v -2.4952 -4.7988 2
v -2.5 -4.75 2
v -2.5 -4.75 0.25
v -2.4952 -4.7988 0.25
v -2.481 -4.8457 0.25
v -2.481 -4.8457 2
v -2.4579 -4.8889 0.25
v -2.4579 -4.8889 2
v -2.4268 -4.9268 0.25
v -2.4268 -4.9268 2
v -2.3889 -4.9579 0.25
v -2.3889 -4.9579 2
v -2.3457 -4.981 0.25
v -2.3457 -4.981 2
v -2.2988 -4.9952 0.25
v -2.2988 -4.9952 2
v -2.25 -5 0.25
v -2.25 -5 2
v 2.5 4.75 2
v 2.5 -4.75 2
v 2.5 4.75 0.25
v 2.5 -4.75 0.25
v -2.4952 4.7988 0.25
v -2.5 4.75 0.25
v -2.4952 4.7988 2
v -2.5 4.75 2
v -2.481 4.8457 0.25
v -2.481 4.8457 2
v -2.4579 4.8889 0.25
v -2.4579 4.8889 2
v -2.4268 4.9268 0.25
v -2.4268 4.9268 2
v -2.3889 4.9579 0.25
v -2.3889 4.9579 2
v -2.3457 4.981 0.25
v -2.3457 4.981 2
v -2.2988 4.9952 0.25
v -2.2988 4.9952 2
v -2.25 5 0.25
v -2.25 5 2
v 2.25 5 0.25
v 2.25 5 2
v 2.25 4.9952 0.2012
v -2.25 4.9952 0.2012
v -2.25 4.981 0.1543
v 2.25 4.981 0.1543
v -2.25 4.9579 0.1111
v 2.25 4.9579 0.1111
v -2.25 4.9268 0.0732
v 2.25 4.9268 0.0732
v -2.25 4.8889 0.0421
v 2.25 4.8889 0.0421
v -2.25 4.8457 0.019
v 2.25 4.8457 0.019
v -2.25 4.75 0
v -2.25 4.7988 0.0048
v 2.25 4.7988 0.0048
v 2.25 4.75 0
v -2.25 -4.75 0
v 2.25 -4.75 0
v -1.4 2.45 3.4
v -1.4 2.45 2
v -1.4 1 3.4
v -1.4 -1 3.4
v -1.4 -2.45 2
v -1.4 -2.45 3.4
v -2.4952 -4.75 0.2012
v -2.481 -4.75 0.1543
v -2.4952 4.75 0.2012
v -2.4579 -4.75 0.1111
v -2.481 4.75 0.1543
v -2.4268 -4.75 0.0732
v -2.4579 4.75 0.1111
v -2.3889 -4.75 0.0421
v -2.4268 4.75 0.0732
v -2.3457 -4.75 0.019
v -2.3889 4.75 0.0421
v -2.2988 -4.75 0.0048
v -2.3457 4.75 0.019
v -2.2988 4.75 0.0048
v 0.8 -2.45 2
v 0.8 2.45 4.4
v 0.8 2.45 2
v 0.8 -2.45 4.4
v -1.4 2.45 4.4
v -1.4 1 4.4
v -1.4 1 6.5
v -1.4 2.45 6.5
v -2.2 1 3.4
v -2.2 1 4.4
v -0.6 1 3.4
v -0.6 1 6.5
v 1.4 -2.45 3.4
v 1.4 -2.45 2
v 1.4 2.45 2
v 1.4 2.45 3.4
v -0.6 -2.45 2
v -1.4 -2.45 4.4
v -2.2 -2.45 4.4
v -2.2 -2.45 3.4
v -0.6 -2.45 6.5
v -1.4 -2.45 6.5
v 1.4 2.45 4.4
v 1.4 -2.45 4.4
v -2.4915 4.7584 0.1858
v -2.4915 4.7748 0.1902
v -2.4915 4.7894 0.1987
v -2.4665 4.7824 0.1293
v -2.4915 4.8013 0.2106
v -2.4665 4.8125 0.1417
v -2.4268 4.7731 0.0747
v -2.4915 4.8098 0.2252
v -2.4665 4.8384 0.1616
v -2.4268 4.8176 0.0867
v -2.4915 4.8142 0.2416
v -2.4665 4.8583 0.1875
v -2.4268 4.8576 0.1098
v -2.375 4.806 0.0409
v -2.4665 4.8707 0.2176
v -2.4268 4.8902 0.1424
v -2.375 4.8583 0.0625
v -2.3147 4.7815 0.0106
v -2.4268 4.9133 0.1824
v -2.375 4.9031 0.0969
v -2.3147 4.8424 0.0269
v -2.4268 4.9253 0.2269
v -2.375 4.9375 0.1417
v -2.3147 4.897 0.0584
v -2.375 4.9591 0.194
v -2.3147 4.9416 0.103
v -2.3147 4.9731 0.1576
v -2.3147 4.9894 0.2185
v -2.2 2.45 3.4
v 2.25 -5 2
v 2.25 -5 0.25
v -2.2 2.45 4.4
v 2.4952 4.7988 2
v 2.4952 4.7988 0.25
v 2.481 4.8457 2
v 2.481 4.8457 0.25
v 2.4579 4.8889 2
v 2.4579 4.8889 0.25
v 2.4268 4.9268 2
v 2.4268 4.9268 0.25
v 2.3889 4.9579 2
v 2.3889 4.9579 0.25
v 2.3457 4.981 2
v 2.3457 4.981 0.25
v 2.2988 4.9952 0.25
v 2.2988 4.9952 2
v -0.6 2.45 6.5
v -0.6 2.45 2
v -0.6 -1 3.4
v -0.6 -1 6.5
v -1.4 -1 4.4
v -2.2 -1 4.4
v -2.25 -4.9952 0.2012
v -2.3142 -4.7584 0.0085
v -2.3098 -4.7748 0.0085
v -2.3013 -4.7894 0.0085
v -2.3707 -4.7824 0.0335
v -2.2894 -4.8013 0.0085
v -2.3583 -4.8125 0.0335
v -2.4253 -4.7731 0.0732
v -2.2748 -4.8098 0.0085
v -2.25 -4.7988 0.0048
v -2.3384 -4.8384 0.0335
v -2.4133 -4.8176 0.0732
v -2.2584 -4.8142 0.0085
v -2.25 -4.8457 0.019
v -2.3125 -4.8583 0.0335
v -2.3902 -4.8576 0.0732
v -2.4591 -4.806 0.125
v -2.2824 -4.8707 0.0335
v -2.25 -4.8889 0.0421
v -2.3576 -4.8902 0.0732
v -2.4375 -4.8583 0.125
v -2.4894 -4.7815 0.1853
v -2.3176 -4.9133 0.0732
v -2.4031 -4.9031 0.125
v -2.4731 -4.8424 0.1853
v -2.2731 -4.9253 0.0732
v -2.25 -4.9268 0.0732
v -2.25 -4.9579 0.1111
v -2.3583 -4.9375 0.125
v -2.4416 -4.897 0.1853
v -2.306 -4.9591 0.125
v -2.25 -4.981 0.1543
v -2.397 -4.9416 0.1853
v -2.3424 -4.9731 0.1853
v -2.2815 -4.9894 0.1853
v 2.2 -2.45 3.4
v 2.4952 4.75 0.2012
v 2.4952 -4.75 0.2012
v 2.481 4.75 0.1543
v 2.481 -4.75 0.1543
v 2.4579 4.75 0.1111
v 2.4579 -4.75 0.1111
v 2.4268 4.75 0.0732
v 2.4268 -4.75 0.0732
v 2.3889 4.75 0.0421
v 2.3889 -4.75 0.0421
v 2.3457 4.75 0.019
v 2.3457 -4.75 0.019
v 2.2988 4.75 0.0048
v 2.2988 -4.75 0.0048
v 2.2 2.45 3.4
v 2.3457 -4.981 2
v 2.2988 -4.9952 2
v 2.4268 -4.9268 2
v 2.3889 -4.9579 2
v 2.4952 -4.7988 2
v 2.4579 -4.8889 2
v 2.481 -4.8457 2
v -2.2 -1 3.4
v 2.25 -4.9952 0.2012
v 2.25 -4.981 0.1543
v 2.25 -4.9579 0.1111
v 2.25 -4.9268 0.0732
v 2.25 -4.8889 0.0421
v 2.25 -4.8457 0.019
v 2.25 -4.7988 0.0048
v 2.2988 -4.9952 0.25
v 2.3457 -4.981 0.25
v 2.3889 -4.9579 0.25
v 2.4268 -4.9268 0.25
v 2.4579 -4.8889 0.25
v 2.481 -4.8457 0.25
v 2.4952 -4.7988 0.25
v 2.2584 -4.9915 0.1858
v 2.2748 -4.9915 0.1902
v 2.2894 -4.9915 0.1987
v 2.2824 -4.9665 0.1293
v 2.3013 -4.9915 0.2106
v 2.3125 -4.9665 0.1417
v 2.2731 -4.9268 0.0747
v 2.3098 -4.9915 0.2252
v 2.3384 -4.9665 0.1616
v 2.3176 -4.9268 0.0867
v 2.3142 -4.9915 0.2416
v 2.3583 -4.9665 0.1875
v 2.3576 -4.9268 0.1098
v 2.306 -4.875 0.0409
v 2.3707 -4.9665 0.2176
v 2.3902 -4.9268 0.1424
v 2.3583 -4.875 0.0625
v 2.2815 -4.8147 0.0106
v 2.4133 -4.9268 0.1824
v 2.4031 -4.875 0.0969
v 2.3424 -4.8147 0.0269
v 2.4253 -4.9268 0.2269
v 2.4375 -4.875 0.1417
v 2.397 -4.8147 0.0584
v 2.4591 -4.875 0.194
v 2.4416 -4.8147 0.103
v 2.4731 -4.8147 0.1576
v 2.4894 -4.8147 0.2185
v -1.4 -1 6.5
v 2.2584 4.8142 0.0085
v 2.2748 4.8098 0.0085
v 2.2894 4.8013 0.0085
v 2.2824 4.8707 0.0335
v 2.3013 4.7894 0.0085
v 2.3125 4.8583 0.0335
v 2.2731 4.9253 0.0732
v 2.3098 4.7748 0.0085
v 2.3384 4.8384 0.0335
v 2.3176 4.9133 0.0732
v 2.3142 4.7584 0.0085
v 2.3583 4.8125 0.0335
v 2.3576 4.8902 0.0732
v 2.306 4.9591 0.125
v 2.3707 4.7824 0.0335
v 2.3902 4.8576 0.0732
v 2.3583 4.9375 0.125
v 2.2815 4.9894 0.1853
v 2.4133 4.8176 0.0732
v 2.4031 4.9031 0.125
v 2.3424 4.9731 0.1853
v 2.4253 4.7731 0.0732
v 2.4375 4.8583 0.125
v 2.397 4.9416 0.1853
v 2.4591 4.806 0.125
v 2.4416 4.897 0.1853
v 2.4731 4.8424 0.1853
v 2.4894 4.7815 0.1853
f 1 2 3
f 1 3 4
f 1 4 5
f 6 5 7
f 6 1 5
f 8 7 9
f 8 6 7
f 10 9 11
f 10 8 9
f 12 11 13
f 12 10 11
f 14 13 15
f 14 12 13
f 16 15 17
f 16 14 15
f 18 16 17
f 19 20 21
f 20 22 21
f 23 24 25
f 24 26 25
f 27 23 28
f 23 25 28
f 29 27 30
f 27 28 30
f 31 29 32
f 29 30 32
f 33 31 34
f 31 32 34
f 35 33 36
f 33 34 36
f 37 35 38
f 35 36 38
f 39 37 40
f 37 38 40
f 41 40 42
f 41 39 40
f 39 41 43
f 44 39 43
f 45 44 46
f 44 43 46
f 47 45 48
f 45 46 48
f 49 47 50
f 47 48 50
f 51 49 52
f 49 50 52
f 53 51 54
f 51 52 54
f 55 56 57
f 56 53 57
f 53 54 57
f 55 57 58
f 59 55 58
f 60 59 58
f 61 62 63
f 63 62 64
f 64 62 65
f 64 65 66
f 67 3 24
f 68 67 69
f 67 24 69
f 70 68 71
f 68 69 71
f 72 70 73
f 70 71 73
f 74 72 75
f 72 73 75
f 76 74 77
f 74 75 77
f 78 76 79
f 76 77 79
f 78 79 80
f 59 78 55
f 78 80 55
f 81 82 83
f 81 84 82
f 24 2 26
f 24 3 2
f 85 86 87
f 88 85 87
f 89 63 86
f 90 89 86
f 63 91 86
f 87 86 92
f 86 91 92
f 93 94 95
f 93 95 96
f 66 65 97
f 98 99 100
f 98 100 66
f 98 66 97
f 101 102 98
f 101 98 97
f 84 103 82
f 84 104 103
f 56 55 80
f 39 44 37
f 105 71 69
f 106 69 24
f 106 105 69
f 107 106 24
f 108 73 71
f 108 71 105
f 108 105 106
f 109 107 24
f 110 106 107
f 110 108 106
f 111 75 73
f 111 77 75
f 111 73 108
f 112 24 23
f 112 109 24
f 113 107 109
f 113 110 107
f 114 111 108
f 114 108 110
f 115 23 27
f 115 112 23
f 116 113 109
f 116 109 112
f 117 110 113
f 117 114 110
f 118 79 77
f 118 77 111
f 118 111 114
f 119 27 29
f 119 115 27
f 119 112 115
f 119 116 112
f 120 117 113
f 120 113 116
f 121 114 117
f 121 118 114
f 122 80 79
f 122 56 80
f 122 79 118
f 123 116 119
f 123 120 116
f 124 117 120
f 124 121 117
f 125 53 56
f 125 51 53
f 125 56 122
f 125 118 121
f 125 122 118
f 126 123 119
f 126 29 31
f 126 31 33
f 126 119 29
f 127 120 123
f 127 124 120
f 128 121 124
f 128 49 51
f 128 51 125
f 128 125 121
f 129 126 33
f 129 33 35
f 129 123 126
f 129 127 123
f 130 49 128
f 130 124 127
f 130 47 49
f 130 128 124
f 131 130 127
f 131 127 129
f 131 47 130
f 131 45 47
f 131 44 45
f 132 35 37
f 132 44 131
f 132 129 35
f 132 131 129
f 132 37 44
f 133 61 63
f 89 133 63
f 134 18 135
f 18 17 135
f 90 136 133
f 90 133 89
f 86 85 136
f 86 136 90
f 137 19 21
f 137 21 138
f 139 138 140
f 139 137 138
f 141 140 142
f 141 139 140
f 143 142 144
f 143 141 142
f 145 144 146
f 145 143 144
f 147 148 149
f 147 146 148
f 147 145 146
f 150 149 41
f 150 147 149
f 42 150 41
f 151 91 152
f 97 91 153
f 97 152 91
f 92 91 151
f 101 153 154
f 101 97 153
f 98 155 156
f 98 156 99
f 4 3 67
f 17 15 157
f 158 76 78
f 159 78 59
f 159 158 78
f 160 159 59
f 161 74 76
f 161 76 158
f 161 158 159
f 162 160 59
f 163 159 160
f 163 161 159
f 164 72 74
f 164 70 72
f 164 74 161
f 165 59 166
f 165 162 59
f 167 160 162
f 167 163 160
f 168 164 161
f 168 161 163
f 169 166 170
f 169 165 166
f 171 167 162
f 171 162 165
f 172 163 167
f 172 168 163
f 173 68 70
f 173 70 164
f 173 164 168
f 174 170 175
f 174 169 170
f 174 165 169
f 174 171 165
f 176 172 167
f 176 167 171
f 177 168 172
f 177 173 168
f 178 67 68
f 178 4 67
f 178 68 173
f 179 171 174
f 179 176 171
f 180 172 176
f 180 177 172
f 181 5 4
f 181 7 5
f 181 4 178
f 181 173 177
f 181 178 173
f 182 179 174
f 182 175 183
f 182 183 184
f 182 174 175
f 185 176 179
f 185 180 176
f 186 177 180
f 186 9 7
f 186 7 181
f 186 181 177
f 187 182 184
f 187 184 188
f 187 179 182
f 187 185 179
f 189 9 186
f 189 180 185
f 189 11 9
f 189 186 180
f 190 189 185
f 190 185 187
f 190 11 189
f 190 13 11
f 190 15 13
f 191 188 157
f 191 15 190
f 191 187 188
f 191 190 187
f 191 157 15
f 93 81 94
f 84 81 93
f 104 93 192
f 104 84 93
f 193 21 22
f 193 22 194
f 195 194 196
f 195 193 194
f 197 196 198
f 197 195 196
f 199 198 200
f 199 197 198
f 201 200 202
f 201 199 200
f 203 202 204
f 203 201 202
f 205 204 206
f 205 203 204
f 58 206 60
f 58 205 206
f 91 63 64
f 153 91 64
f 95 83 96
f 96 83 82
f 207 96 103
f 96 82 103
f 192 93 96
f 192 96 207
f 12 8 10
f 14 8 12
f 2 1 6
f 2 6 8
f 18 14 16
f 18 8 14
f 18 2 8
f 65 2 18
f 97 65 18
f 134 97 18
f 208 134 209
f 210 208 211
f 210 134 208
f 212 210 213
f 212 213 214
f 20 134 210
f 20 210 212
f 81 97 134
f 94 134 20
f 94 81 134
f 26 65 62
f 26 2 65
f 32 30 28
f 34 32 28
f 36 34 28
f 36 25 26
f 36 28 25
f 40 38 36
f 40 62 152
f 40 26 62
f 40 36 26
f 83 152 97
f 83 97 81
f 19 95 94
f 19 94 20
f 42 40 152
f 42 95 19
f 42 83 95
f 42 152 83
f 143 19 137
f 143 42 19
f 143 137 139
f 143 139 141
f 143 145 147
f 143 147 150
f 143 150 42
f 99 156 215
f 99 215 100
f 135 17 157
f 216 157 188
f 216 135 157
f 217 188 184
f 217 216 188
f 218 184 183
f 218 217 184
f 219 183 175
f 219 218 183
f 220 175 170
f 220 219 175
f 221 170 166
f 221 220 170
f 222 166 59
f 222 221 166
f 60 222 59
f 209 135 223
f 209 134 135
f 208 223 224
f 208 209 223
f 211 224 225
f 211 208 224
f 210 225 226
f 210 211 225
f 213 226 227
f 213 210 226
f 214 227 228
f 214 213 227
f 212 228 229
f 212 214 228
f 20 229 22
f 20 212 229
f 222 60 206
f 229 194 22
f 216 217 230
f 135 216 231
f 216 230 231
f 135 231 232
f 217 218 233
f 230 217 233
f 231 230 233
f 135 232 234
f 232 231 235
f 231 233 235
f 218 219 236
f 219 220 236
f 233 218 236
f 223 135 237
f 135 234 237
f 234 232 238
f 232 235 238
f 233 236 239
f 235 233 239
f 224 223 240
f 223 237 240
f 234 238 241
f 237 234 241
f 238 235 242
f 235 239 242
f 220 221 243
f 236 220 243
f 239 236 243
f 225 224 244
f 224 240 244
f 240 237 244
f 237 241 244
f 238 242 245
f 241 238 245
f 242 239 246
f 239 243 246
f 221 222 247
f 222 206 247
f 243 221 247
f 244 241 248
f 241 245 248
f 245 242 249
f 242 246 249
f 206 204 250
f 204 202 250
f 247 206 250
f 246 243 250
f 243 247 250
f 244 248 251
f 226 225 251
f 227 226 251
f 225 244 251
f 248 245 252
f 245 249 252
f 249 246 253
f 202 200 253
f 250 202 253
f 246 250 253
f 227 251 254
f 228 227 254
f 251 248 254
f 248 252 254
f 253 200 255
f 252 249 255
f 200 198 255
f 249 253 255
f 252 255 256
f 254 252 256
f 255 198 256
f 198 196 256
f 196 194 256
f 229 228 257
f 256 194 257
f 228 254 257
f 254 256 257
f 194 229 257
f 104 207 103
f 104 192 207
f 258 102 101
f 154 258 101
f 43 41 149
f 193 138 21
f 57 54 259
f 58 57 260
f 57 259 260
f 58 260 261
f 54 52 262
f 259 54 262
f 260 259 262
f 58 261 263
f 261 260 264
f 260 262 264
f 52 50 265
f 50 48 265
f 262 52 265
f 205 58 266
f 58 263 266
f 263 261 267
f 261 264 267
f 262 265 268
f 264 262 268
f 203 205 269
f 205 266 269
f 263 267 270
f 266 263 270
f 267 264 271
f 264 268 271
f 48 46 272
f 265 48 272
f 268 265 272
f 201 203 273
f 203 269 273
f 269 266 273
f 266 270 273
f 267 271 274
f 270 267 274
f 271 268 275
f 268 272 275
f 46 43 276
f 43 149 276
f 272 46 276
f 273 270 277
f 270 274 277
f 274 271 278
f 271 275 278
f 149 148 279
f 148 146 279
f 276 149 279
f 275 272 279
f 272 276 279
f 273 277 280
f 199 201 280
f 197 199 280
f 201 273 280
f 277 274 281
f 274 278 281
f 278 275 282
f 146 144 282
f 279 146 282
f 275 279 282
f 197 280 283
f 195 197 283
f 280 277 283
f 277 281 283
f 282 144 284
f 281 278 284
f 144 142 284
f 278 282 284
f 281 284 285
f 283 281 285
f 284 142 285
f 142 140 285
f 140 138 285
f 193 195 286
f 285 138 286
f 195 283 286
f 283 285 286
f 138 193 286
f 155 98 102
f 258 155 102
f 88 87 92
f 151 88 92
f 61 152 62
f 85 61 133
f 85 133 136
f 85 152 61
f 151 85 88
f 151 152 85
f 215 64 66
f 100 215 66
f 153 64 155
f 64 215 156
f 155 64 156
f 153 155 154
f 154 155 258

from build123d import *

# Parameters (mm, degrees)
F0_W      = 5
F0_H      = 10
F1_DEPTH  = 2
F2_R      = 0.25
F4_DEPTH  = 2.45
F5_W      = 0.8
F5_H      = 4.5
F6_DEPTH  = 2.45
F7_W      = 2
F7_H      = 3.1
F8_DEPTH  = 0.8
F9_W      = 1.45
F9_H      = 1
F10_DEPTH = 0.8


# Not quite as in the source:
# - a feature names something its author has since deleted; it is built from what else it names


with BuildPart() as f1:
    # F0 (on Top) → F1 (new body)
    with BuildSketch(Plane.XY):
        Rectangle(F0_W, F0_H)
    extrude(amount=F1_DEPTH)

    # F2
    f2_edges = [f1.edges().sort_by_distance(p)[0] for p in [
        (2.5, 5, 1),
        (-2.5, -5, 1),
        (0, 5, 0),
        (2.5, 0, 0),
        (-2.5, 0, 0),
        (0, -5, 0),
        (-2.5, 5, 1),
        (2.5, -5, 1),
    ]]
    fillet(f2_edges, radius=F2_R)

    # F3 (on Front) → F4 (join, symmetric)
    with BuildSketch(Plane.XZ):
        Polygon((0.8, 4.4), (0.8, 2), (1.4, 2), (1.4, 3.4), (2.2, 3.4), (1.4, 4.4), align=None)
    extrude(amount=F4_DEPTH, both=True)

    # F5 (on Front) → F6 (join, symmetric)
    with BuildSketch(Plane.XZ):
        with Locations((-1, 4.25)):
            Rectangle(F5_W, F5_H)
    extrude(amount=F6_DEPTH, both=True)

    # F7 (on face) → F8 (cut, through all)
    with BuildSketch(Plane(origin=(-1.4, 0, 0), x_dir=(0, -1, 0), z_dir=(-1, 0, 0))):
        with Locations((0, 4.95)):
            Rectangle(F7_W, F7_H)
    extrude(amount=-F8_DEPTH, mode=Mode.SUBTRACT)

    # F9 (on face) → F10 (join)
    with BuildSketch(Plane(origin=(-1.4, 0, 0), x_dir=(0, -1, 0), z_dir=(-1, 0, 0))):
        with Locations((-1.725, 3.9)):
            Rectangle(F9_W, F9_H)
        with Locations((1.725, 3.9)):
            Rectangle(F9_W, F9_H)
    extrude(amount=F10_DEPTH)


solid = f1.part
